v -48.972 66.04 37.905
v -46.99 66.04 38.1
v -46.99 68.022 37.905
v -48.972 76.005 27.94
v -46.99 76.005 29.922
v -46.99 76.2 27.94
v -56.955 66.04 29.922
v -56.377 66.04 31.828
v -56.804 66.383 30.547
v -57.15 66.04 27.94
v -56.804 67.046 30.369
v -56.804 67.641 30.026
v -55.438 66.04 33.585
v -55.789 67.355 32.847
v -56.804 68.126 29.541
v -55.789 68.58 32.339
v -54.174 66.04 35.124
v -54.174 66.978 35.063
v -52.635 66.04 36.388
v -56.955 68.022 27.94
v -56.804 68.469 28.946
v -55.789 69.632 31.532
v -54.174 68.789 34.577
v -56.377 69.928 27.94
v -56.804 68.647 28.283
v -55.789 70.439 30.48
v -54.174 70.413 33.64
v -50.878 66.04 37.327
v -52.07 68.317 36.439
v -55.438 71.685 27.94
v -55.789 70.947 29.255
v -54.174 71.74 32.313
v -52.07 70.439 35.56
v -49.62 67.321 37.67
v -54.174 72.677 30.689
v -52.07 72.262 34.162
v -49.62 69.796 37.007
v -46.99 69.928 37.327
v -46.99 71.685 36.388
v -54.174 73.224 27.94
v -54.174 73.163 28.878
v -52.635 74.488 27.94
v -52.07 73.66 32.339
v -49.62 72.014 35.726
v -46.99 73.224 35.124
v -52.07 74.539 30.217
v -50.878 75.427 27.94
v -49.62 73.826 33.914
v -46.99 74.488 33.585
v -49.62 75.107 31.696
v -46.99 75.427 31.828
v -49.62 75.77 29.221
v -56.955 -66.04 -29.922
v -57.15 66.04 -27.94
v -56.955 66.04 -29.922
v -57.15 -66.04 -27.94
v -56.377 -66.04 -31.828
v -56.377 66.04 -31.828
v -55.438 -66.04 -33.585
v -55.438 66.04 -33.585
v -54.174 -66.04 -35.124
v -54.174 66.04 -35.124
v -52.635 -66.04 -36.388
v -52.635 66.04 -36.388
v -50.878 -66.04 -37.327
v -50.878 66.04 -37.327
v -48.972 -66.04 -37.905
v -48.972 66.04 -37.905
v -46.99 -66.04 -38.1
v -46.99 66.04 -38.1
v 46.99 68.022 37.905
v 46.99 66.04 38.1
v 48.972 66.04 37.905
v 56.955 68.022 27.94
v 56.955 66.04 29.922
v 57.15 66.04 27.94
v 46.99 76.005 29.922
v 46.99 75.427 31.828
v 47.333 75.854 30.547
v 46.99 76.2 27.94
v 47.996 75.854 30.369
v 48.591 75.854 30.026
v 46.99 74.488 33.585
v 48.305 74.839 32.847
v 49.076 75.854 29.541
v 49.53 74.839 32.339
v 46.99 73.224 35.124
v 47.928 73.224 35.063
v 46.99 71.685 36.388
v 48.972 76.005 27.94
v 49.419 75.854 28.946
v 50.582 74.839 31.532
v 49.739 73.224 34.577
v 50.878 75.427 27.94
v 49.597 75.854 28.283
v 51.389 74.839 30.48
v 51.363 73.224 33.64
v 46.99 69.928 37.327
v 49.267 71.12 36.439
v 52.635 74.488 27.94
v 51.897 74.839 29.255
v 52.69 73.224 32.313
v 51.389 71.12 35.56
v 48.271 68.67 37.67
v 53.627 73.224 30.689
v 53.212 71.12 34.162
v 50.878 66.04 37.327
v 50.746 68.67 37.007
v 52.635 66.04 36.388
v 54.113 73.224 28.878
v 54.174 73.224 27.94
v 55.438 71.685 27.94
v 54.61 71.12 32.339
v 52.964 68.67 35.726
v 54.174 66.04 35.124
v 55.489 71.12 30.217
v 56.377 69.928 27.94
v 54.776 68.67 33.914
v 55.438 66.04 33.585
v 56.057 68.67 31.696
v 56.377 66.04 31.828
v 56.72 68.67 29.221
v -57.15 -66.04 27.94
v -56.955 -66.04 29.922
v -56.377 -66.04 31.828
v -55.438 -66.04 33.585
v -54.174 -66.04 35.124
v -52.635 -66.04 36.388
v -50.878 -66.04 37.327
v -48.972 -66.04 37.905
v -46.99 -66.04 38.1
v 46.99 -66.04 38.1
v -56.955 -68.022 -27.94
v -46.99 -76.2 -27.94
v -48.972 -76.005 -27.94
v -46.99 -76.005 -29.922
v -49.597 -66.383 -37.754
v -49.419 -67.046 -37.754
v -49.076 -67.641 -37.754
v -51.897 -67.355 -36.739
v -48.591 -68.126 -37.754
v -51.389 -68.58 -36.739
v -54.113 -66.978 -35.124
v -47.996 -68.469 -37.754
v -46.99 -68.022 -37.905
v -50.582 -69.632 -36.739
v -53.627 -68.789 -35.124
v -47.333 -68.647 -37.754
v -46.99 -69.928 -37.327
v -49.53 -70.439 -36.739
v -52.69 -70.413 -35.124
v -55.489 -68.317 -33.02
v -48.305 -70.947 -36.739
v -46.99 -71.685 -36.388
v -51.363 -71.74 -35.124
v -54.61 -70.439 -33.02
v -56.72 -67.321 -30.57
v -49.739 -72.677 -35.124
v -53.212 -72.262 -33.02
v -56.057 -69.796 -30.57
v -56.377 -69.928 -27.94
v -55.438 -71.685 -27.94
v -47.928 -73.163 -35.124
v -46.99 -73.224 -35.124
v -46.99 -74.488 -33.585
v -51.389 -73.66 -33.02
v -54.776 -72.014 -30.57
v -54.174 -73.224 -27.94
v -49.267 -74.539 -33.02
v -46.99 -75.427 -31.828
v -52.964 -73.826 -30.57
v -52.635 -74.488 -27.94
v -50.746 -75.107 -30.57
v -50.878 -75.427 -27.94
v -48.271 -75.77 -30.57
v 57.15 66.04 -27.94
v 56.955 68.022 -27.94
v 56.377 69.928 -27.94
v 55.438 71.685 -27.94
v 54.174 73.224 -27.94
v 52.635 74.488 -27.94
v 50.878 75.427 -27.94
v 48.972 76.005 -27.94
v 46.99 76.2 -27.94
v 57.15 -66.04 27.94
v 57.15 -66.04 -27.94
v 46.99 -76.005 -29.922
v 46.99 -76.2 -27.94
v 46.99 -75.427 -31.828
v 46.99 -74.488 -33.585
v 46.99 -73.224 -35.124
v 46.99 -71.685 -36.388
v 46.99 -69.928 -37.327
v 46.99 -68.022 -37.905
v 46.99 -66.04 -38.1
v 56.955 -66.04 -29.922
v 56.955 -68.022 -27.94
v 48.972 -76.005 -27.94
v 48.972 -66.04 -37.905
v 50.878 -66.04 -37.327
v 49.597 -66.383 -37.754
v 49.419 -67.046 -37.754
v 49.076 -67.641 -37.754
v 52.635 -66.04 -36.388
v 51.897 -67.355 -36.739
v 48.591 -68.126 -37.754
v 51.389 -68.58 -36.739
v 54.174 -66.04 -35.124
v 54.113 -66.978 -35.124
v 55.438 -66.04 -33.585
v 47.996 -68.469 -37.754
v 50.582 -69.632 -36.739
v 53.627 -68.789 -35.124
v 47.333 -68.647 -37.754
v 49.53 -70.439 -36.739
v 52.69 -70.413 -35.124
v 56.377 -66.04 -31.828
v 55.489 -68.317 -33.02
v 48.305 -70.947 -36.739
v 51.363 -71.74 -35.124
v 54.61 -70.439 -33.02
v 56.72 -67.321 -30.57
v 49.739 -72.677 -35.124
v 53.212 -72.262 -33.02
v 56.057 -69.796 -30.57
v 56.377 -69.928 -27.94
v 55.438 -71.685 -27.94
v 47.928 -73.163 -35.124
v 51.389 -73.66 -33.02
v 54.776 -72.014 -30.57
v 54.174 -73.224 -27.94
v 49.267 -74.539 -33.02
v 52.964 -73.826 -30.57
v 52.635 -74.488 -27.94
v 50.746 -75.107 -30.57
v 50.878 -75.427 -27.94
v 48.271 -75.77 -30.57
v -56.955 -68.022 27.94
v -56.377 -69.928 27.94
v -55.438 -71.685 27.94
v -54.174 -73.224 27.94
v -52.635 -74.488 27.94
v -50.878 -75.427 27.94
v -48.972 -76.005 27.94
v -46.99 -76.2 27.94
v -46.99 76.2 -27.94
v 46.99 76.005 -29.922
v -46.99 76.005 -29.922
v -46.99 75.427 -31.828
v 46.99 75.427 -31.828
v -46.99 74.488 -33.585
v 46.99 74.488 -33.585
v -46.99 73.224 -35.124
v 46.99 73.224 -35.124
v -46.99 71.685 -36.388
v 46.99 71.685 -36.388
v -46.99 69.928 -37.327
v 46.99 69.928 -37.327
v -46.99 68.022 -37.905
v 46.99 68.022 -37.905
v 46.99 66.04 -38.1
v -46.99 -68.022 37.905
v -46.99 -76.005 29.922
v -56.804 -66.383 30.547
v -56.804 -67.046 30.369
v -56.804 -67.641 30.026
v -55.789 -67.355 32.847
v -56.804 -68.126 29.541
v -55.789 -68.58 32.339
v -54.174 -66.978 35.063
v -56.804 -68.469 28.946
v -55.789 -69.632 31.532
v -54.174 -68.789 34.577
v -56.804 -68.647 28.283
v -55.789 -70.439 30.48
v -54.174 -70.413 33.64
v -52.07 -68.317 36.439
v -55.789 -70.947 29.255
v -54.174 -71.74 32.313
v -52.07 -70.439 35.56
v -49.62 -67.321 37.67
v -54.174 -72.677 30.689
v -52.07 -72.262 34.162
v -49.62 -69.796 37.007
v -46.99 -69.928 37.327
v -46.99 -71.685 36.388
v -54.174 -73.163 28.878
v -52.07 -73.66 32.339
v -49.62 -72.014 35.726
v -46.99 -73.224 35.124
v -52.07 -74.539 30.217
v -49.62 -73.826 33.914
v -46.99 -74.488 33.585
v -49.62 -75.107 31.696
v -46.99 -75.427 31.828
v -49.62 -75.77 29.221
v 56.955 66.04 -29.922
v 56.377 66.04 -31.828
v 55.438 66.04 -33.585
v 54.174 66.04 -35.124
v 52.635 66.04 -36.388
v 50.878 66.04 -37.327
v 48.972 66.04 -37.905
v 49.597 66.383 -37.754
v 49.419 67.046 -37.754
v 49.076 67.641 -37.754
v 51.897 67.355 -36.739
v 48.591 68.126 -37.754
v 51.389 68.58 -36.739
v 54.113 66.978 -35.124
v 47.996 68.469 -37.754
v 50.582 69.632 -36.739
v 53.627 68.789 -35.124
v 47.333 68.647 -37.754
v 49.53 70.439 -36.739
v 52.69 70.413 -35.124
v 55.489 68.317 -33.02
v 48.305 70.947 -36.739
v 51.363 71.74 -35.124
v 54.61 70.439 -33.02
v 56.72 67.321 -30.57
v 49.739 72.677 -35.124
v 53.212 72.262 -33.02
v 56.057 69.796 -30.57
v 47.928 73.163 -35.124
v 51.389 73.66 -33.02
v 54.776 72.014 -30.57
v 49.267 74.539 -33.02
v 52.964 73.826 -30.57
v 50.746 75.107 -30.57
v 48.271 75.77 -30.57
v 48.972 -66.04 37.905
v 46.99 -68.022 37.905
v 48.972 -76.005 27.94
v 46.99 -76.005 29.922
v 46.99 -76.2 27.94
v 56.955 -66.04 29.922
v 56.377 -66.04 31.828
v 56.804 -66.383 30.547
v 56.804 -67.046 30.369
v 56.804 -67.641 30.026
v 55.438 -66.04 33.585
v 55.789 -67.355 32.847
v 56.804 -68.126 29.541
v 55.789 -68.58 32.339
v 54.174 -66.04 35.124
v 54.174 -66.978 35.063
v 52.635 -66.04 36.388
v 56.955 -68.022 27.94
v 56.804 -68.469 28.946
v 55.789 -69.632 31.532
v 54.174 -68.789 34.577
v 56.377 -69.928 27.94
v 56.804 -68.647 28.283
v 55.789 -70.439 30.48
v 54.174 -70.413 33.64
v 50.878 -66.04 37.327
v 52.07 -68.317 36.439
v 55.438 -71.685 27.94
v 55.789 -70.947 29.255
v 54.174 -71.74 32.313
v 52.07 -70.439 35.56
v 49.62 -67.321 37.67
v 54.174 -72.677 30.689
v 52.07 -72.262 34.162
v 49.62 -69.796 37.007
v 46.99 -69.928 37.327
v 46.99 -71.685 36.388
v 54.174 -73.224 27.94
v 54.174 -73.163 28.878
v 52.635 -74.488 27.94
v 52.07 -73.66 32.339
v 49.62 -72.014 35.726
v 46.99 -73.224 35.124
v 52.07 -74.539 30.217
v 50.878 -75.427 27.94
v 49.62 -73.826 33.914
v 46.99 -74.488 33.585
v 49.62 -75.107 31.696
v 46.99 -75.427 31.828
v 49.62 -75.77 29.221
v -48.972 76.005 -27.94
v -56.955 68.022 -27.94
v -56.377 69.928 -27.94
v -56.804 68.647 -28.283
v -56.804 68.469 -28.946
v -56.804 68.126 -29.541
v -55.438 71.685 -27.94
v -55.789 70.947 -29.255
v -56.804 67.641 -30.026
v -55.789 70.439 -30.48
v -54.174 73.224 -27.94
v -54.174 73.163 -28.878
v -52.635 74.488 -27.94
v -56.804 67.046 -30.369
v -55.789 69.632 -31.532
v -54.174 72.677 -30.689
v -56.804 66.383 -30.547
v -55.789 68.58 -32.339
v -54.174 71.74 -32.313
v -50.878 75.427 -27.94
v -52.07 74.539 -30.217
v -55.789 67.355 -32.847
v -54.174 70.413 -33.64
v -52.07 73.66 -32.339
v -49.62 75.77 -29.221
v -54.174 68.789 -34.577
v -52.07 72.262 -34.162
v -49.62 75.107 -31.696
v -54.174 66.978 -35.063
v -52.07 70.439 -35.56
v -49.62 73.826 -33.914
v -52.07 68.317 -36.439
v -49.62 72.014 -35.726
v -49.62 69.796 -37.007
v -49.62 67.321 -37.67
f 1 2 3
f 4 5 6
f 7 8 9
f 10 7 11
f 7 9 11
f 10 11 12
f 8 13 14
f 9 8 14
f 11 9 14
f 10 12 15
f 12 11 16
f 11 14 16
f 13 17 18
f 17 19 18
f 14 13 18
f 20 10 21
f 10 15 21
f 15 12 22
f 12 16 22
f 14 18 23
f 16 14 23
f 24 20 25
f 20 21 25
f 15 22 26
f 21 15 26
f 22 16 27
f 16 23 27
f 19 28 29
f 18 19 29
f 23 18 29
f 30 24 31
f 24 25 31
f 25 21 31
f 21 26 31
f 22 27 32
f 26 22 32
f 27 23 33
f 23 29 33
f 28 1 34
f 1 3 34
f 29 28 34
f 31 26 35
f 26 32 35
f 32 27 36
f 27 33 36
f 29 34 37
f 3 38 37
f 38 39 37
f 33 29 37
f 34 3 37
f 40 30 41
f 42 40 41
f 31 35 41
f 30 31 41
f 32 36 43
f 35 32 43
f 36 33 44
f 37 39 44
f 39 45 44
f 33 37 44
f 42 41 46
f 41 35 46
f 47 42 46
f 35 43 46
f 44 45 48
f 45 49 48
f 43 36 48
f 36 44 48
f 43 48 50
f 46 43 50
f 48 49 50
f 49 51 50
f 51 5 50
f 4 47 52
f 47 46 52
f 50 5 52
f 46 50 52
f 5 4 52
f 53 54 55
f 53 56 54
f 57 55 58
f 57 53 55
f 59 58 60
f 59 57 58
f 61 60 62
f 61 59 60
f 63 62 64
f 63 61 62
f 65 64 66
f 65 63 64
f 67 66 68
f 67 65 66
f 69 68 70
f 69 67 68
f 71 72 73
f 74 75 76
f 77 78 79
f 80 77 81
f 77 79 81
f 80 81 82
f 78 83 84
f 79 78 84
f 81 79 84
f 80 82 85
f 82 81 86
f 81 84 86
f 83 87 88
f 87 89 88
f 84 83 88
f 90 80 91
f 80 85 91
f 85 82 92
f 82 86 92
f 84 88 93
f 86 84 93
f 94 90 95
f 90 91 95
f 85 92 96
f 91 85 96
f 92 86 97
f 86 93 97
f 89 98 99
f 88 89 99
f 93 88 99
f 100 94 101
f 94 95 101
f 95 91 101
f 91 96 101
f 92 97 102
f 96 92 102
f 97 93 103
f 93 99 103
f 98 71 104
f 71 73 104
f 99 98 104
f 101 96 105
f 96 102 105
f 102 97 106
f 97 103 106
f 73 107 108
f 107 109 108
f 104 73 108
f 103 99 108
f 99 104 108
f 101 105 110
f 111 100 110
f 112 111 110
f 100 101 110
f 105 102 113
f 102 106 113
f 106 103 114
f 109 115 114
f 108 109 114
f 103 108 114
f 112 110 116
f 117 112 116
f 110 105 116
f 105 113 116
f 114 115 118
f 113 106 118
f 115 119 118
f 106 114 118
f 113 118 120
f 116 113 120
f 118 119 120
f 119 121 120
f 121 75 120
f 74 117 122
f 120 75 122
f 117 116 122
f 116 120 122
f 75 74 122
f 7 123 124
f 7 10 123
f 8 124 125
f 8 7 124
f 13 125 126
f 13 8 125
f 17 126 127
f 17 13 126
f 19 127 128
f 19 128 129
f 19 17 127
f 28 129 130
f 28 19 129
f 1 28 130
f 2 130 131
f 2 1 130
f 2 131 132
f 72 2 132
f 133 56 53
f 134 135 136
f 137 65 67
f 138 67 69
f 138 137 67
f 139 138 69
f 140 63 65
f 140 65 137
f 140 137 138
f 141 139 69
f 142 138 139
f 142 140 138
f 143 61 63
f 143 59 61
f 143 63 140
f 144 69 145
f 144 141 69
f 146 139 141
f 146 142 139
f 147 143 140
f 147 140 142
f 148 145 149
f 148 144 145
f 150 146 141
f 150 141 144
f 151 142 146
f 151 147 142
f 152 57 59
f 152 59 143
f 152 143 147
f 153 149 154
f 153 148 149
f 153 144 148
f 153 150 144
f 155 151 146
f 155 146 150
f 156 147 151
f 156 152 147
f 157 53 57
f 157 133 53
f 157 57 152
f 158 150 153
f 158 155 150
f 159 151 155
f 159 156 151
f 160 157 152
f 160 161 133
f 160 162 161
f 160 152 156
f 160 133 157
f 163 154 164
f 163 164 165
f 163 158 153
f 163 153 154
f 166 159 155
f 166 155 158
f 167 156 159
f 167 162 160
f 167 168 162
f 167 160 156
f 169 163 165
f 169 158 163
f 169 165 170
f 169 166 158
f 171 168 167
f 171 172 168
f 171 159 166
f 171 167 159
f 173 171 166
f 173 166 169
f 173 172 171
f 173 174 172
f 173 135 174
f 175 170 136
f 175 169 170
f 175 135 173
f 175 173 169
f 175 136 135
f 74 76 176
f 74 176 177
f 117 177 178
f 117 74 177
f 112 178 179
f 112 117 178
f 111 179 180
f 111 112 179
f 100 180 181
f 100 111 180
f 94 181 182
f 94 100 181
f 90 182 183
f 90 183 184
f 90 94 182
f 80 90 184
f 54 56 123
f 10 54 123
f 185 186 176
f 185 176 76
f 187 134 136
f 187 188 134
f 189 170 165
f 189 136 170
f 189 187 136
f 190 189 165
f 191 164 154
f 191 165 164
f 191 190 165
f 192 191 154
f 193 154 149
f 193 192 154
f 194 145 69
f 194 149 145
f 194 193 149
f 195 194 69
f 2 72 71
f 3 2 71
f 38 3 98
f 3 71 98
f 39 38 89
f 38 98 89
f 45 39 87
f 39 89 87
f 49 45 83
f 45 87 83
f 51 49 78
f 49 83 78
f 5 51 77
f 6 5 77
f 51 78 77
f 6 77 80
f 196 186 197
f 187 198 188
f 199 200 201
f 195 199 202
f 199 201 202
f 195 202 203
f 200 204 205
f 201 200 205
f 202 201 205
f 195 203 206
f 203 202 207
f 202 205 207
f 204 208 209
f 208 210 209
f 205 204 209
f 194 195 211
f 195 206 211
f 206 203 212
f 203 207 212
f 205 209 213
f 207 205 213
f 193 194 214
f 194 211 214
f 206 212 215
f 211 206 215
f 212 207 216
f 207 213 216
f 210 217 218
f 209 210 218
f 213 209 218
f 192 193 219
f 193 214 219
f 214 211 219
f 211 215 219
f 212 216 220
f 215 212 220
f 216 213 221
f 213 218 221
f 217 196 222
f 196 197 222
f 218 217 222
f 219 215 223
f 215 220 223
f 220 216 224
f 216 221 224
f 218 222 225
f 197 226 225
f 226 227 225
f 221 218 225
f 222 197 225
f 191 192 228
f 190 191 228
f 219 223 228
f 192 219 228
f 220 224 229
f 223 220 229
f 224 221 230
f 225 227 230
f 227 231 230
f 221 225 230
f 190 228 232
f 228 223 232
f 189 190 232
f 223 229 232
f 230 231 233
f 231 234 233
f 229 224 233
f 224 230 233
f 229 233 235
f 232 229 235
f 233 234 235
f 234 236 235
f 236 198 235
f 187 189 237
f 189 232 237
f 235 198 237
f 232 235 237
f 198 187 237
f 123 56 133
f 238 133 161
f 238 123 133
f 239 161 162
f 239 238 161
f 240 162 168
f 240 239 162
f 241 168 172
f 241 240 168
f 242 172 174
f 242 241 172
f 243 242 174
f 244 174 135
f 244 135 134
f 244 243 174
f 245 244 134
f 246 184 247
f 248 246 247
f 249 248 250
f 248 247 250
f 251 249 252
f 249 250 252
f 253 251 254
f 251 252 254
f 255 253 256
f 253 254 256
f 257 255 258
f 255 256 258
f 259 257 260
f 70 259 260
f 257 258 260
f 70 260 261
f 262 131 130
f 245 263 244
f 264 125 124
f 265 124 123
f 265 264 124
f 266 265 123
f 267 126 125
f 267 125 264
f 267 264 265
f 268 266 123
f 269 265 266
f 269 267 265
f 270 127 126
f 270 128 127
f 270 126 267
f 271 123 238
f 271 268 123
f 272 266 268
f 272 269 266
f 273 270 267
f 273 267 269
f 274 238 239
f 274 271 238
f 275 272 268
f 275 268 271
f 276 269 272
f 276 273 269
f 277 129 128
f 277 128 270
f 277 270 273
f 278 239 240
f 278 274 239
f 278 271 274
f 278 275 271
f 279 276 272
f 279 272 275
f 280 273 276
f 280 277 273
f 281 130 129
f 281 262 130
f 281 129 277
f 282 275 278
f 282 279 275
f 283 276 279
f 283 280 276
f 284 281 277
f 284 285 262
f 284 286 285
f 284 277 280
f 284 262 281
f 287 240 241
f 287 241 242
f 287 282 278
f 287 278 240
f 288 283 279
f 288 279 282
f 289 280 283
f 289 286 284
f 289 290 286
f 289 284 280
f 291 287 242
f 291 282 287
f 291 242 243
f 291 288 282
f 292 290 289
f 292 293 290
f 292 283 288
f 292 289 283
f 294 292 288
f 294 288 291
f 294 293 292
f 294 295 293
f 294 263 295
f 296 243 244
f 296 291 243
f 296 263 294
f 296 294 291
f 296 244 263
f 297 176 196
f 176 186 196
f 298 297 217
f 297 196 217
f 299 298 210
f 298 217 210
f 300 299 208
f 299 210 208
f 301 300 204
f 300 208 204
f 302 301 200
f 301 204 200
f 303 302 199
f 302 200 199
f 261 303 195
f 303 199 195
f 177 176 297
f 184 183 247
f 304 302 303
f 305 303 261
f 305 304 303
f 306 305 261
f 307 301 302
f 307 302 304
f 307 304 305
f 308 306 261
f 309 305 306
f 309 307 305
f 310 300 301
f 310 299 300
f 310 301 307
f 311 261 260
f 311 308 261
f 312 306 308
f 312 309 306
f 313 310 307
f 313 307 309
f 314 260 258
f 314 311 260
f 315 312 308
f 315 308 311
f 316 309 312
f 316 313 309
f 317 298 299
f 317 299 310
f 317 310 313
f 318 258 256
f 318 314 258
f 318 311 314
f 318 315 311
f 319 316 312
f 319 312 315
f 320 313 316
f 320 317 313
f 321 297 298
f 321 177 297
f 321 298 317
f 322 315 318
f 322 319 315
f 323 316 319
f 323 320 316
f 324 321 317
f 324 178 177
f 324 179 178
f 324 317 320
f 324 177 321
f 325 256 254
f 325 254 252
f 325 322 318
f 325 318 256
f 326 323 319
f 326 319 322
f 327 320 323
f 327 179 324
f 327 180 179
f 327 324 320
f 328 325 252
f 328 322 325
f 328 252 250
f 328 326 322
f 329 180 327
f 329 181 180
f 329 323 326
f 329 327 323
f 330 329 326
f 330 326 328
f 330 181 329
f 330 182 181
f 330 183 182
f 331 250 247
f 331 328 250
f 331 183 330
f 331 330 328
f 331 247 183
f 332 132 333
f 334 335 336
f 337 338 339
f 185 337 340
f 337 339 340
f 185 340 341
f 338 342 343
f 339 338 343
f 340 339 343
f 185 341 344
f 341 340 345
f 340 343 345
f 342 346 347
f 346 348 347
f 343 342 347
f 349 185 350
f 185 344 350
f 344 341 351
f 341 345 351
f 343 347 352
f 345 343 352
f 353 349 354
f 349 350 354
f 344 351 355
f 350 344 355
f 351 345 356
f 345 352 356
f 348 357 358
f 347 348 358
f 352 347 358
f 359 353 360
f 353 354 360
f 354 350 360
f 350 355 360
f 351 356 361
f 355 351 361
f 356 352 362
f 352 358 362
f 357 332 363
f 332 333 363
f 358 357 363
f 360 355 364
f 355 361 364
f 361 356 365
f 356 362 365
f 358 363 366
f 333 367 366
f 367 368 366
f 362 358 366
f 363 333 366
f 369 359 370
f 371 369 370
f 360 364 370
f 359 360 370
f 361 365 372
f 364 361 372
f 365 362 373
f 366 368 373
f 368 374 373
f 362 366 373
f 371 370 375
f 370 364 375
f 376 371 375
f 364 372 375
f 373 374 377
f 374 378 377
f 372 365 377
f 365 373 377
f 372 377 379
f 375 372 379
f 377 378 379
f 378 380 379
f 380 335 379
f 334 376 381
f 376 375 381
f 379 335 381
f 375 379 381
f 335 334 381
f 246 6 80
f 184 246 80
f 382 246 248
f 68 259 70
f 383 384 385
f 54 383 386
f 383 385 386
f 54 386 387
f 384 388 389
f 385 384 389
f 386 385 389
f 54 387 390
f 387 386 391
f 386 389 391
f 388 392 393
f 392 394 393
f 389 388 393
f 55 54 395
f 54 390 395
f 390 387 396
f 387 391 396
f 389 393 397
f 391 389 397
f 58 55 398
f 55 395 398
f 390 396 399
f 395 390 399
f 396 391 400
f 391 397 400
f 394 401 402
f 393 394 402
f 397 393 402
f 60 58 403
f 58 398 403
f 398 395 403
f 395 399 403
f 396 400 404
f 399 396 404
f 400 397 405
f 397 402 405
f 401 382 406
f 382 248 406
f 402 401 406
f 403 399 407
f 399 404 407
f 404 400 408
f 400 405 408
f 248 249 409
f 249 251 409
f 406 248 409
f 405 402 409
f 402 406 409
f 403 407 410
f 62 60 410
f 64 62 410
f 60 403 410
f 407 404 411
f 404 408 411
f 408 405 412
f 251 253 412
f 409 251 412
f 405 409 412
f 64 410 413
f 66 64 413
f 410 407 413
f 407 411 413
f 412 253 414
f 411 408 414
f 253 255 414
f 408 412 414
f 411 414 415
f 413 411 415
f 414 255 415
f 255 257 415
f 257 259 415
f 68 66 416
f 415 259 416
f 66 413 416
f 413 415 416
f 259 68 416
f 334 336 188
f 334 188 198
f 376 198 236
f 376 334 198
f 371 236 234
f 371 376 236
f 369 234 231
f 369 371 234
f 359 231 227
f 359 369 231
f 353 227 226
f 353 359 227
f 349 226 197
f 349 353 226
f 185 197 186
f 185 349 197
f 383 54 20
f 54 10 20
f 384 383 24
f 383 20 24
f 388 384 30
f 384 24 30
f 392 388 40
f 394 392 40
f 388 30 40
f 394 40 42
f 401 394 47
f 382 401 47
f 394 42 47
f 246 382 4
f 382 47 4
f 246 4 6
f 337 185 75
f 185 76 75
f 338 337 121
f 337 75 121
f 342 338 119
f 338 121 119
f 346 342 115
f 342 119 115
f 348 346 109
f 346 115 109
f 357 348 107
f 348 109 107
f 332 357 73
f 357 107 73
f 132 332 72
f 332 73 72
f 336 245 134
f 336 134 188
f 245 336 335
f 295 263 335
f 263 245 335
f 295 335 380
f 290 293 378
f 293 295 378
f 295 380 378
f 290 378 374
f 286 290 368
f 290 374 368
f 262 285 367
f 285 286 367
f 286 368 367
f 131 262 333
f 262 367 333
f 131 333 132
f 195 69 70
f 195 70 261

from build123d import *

# Parameters (mm, degrees)
F0_W          = 114.3
F0_H          = 76.2
F1_DEPTH      = 76.2
F1_DEPTH_BACK = 76.2
F2_R          = 10.16


with BuildPart() as f1:
    # F0 (on Front) → F1 (new body, two sides)
    with BuildSketch(Plane.XZ) as f1_sk:
        Rectangle(F0_W, F0_H)
    extrude(amount=F1_DEPTH)
    extrude(f1_sk.sketch, amount=-F1_DEPTH_BACK)

    # F2
    f2_edges = [f1.edges().sort_by_distance(p)[0] for p in [
        (0, -76.2, 38.1),
        (57.15, 0, 38.1),
        (0, 76.2, 38.1),
        (-57.15, 0, 38.1),
        (57.15, -76.2, 0),
        (57.15, 76.2, 0),
        (57.15, 0, -38.1),
        (-57.15, -76.2, 0),
        (0, 76.2, -38.1),
        (-57.15, 76.2, 0),
        (-57.15, 0, -38.1),
        (0, -76.2, -38.1),
    ]]
    fillet(f2_edges, radius=F2_R)


solid = f1.part
